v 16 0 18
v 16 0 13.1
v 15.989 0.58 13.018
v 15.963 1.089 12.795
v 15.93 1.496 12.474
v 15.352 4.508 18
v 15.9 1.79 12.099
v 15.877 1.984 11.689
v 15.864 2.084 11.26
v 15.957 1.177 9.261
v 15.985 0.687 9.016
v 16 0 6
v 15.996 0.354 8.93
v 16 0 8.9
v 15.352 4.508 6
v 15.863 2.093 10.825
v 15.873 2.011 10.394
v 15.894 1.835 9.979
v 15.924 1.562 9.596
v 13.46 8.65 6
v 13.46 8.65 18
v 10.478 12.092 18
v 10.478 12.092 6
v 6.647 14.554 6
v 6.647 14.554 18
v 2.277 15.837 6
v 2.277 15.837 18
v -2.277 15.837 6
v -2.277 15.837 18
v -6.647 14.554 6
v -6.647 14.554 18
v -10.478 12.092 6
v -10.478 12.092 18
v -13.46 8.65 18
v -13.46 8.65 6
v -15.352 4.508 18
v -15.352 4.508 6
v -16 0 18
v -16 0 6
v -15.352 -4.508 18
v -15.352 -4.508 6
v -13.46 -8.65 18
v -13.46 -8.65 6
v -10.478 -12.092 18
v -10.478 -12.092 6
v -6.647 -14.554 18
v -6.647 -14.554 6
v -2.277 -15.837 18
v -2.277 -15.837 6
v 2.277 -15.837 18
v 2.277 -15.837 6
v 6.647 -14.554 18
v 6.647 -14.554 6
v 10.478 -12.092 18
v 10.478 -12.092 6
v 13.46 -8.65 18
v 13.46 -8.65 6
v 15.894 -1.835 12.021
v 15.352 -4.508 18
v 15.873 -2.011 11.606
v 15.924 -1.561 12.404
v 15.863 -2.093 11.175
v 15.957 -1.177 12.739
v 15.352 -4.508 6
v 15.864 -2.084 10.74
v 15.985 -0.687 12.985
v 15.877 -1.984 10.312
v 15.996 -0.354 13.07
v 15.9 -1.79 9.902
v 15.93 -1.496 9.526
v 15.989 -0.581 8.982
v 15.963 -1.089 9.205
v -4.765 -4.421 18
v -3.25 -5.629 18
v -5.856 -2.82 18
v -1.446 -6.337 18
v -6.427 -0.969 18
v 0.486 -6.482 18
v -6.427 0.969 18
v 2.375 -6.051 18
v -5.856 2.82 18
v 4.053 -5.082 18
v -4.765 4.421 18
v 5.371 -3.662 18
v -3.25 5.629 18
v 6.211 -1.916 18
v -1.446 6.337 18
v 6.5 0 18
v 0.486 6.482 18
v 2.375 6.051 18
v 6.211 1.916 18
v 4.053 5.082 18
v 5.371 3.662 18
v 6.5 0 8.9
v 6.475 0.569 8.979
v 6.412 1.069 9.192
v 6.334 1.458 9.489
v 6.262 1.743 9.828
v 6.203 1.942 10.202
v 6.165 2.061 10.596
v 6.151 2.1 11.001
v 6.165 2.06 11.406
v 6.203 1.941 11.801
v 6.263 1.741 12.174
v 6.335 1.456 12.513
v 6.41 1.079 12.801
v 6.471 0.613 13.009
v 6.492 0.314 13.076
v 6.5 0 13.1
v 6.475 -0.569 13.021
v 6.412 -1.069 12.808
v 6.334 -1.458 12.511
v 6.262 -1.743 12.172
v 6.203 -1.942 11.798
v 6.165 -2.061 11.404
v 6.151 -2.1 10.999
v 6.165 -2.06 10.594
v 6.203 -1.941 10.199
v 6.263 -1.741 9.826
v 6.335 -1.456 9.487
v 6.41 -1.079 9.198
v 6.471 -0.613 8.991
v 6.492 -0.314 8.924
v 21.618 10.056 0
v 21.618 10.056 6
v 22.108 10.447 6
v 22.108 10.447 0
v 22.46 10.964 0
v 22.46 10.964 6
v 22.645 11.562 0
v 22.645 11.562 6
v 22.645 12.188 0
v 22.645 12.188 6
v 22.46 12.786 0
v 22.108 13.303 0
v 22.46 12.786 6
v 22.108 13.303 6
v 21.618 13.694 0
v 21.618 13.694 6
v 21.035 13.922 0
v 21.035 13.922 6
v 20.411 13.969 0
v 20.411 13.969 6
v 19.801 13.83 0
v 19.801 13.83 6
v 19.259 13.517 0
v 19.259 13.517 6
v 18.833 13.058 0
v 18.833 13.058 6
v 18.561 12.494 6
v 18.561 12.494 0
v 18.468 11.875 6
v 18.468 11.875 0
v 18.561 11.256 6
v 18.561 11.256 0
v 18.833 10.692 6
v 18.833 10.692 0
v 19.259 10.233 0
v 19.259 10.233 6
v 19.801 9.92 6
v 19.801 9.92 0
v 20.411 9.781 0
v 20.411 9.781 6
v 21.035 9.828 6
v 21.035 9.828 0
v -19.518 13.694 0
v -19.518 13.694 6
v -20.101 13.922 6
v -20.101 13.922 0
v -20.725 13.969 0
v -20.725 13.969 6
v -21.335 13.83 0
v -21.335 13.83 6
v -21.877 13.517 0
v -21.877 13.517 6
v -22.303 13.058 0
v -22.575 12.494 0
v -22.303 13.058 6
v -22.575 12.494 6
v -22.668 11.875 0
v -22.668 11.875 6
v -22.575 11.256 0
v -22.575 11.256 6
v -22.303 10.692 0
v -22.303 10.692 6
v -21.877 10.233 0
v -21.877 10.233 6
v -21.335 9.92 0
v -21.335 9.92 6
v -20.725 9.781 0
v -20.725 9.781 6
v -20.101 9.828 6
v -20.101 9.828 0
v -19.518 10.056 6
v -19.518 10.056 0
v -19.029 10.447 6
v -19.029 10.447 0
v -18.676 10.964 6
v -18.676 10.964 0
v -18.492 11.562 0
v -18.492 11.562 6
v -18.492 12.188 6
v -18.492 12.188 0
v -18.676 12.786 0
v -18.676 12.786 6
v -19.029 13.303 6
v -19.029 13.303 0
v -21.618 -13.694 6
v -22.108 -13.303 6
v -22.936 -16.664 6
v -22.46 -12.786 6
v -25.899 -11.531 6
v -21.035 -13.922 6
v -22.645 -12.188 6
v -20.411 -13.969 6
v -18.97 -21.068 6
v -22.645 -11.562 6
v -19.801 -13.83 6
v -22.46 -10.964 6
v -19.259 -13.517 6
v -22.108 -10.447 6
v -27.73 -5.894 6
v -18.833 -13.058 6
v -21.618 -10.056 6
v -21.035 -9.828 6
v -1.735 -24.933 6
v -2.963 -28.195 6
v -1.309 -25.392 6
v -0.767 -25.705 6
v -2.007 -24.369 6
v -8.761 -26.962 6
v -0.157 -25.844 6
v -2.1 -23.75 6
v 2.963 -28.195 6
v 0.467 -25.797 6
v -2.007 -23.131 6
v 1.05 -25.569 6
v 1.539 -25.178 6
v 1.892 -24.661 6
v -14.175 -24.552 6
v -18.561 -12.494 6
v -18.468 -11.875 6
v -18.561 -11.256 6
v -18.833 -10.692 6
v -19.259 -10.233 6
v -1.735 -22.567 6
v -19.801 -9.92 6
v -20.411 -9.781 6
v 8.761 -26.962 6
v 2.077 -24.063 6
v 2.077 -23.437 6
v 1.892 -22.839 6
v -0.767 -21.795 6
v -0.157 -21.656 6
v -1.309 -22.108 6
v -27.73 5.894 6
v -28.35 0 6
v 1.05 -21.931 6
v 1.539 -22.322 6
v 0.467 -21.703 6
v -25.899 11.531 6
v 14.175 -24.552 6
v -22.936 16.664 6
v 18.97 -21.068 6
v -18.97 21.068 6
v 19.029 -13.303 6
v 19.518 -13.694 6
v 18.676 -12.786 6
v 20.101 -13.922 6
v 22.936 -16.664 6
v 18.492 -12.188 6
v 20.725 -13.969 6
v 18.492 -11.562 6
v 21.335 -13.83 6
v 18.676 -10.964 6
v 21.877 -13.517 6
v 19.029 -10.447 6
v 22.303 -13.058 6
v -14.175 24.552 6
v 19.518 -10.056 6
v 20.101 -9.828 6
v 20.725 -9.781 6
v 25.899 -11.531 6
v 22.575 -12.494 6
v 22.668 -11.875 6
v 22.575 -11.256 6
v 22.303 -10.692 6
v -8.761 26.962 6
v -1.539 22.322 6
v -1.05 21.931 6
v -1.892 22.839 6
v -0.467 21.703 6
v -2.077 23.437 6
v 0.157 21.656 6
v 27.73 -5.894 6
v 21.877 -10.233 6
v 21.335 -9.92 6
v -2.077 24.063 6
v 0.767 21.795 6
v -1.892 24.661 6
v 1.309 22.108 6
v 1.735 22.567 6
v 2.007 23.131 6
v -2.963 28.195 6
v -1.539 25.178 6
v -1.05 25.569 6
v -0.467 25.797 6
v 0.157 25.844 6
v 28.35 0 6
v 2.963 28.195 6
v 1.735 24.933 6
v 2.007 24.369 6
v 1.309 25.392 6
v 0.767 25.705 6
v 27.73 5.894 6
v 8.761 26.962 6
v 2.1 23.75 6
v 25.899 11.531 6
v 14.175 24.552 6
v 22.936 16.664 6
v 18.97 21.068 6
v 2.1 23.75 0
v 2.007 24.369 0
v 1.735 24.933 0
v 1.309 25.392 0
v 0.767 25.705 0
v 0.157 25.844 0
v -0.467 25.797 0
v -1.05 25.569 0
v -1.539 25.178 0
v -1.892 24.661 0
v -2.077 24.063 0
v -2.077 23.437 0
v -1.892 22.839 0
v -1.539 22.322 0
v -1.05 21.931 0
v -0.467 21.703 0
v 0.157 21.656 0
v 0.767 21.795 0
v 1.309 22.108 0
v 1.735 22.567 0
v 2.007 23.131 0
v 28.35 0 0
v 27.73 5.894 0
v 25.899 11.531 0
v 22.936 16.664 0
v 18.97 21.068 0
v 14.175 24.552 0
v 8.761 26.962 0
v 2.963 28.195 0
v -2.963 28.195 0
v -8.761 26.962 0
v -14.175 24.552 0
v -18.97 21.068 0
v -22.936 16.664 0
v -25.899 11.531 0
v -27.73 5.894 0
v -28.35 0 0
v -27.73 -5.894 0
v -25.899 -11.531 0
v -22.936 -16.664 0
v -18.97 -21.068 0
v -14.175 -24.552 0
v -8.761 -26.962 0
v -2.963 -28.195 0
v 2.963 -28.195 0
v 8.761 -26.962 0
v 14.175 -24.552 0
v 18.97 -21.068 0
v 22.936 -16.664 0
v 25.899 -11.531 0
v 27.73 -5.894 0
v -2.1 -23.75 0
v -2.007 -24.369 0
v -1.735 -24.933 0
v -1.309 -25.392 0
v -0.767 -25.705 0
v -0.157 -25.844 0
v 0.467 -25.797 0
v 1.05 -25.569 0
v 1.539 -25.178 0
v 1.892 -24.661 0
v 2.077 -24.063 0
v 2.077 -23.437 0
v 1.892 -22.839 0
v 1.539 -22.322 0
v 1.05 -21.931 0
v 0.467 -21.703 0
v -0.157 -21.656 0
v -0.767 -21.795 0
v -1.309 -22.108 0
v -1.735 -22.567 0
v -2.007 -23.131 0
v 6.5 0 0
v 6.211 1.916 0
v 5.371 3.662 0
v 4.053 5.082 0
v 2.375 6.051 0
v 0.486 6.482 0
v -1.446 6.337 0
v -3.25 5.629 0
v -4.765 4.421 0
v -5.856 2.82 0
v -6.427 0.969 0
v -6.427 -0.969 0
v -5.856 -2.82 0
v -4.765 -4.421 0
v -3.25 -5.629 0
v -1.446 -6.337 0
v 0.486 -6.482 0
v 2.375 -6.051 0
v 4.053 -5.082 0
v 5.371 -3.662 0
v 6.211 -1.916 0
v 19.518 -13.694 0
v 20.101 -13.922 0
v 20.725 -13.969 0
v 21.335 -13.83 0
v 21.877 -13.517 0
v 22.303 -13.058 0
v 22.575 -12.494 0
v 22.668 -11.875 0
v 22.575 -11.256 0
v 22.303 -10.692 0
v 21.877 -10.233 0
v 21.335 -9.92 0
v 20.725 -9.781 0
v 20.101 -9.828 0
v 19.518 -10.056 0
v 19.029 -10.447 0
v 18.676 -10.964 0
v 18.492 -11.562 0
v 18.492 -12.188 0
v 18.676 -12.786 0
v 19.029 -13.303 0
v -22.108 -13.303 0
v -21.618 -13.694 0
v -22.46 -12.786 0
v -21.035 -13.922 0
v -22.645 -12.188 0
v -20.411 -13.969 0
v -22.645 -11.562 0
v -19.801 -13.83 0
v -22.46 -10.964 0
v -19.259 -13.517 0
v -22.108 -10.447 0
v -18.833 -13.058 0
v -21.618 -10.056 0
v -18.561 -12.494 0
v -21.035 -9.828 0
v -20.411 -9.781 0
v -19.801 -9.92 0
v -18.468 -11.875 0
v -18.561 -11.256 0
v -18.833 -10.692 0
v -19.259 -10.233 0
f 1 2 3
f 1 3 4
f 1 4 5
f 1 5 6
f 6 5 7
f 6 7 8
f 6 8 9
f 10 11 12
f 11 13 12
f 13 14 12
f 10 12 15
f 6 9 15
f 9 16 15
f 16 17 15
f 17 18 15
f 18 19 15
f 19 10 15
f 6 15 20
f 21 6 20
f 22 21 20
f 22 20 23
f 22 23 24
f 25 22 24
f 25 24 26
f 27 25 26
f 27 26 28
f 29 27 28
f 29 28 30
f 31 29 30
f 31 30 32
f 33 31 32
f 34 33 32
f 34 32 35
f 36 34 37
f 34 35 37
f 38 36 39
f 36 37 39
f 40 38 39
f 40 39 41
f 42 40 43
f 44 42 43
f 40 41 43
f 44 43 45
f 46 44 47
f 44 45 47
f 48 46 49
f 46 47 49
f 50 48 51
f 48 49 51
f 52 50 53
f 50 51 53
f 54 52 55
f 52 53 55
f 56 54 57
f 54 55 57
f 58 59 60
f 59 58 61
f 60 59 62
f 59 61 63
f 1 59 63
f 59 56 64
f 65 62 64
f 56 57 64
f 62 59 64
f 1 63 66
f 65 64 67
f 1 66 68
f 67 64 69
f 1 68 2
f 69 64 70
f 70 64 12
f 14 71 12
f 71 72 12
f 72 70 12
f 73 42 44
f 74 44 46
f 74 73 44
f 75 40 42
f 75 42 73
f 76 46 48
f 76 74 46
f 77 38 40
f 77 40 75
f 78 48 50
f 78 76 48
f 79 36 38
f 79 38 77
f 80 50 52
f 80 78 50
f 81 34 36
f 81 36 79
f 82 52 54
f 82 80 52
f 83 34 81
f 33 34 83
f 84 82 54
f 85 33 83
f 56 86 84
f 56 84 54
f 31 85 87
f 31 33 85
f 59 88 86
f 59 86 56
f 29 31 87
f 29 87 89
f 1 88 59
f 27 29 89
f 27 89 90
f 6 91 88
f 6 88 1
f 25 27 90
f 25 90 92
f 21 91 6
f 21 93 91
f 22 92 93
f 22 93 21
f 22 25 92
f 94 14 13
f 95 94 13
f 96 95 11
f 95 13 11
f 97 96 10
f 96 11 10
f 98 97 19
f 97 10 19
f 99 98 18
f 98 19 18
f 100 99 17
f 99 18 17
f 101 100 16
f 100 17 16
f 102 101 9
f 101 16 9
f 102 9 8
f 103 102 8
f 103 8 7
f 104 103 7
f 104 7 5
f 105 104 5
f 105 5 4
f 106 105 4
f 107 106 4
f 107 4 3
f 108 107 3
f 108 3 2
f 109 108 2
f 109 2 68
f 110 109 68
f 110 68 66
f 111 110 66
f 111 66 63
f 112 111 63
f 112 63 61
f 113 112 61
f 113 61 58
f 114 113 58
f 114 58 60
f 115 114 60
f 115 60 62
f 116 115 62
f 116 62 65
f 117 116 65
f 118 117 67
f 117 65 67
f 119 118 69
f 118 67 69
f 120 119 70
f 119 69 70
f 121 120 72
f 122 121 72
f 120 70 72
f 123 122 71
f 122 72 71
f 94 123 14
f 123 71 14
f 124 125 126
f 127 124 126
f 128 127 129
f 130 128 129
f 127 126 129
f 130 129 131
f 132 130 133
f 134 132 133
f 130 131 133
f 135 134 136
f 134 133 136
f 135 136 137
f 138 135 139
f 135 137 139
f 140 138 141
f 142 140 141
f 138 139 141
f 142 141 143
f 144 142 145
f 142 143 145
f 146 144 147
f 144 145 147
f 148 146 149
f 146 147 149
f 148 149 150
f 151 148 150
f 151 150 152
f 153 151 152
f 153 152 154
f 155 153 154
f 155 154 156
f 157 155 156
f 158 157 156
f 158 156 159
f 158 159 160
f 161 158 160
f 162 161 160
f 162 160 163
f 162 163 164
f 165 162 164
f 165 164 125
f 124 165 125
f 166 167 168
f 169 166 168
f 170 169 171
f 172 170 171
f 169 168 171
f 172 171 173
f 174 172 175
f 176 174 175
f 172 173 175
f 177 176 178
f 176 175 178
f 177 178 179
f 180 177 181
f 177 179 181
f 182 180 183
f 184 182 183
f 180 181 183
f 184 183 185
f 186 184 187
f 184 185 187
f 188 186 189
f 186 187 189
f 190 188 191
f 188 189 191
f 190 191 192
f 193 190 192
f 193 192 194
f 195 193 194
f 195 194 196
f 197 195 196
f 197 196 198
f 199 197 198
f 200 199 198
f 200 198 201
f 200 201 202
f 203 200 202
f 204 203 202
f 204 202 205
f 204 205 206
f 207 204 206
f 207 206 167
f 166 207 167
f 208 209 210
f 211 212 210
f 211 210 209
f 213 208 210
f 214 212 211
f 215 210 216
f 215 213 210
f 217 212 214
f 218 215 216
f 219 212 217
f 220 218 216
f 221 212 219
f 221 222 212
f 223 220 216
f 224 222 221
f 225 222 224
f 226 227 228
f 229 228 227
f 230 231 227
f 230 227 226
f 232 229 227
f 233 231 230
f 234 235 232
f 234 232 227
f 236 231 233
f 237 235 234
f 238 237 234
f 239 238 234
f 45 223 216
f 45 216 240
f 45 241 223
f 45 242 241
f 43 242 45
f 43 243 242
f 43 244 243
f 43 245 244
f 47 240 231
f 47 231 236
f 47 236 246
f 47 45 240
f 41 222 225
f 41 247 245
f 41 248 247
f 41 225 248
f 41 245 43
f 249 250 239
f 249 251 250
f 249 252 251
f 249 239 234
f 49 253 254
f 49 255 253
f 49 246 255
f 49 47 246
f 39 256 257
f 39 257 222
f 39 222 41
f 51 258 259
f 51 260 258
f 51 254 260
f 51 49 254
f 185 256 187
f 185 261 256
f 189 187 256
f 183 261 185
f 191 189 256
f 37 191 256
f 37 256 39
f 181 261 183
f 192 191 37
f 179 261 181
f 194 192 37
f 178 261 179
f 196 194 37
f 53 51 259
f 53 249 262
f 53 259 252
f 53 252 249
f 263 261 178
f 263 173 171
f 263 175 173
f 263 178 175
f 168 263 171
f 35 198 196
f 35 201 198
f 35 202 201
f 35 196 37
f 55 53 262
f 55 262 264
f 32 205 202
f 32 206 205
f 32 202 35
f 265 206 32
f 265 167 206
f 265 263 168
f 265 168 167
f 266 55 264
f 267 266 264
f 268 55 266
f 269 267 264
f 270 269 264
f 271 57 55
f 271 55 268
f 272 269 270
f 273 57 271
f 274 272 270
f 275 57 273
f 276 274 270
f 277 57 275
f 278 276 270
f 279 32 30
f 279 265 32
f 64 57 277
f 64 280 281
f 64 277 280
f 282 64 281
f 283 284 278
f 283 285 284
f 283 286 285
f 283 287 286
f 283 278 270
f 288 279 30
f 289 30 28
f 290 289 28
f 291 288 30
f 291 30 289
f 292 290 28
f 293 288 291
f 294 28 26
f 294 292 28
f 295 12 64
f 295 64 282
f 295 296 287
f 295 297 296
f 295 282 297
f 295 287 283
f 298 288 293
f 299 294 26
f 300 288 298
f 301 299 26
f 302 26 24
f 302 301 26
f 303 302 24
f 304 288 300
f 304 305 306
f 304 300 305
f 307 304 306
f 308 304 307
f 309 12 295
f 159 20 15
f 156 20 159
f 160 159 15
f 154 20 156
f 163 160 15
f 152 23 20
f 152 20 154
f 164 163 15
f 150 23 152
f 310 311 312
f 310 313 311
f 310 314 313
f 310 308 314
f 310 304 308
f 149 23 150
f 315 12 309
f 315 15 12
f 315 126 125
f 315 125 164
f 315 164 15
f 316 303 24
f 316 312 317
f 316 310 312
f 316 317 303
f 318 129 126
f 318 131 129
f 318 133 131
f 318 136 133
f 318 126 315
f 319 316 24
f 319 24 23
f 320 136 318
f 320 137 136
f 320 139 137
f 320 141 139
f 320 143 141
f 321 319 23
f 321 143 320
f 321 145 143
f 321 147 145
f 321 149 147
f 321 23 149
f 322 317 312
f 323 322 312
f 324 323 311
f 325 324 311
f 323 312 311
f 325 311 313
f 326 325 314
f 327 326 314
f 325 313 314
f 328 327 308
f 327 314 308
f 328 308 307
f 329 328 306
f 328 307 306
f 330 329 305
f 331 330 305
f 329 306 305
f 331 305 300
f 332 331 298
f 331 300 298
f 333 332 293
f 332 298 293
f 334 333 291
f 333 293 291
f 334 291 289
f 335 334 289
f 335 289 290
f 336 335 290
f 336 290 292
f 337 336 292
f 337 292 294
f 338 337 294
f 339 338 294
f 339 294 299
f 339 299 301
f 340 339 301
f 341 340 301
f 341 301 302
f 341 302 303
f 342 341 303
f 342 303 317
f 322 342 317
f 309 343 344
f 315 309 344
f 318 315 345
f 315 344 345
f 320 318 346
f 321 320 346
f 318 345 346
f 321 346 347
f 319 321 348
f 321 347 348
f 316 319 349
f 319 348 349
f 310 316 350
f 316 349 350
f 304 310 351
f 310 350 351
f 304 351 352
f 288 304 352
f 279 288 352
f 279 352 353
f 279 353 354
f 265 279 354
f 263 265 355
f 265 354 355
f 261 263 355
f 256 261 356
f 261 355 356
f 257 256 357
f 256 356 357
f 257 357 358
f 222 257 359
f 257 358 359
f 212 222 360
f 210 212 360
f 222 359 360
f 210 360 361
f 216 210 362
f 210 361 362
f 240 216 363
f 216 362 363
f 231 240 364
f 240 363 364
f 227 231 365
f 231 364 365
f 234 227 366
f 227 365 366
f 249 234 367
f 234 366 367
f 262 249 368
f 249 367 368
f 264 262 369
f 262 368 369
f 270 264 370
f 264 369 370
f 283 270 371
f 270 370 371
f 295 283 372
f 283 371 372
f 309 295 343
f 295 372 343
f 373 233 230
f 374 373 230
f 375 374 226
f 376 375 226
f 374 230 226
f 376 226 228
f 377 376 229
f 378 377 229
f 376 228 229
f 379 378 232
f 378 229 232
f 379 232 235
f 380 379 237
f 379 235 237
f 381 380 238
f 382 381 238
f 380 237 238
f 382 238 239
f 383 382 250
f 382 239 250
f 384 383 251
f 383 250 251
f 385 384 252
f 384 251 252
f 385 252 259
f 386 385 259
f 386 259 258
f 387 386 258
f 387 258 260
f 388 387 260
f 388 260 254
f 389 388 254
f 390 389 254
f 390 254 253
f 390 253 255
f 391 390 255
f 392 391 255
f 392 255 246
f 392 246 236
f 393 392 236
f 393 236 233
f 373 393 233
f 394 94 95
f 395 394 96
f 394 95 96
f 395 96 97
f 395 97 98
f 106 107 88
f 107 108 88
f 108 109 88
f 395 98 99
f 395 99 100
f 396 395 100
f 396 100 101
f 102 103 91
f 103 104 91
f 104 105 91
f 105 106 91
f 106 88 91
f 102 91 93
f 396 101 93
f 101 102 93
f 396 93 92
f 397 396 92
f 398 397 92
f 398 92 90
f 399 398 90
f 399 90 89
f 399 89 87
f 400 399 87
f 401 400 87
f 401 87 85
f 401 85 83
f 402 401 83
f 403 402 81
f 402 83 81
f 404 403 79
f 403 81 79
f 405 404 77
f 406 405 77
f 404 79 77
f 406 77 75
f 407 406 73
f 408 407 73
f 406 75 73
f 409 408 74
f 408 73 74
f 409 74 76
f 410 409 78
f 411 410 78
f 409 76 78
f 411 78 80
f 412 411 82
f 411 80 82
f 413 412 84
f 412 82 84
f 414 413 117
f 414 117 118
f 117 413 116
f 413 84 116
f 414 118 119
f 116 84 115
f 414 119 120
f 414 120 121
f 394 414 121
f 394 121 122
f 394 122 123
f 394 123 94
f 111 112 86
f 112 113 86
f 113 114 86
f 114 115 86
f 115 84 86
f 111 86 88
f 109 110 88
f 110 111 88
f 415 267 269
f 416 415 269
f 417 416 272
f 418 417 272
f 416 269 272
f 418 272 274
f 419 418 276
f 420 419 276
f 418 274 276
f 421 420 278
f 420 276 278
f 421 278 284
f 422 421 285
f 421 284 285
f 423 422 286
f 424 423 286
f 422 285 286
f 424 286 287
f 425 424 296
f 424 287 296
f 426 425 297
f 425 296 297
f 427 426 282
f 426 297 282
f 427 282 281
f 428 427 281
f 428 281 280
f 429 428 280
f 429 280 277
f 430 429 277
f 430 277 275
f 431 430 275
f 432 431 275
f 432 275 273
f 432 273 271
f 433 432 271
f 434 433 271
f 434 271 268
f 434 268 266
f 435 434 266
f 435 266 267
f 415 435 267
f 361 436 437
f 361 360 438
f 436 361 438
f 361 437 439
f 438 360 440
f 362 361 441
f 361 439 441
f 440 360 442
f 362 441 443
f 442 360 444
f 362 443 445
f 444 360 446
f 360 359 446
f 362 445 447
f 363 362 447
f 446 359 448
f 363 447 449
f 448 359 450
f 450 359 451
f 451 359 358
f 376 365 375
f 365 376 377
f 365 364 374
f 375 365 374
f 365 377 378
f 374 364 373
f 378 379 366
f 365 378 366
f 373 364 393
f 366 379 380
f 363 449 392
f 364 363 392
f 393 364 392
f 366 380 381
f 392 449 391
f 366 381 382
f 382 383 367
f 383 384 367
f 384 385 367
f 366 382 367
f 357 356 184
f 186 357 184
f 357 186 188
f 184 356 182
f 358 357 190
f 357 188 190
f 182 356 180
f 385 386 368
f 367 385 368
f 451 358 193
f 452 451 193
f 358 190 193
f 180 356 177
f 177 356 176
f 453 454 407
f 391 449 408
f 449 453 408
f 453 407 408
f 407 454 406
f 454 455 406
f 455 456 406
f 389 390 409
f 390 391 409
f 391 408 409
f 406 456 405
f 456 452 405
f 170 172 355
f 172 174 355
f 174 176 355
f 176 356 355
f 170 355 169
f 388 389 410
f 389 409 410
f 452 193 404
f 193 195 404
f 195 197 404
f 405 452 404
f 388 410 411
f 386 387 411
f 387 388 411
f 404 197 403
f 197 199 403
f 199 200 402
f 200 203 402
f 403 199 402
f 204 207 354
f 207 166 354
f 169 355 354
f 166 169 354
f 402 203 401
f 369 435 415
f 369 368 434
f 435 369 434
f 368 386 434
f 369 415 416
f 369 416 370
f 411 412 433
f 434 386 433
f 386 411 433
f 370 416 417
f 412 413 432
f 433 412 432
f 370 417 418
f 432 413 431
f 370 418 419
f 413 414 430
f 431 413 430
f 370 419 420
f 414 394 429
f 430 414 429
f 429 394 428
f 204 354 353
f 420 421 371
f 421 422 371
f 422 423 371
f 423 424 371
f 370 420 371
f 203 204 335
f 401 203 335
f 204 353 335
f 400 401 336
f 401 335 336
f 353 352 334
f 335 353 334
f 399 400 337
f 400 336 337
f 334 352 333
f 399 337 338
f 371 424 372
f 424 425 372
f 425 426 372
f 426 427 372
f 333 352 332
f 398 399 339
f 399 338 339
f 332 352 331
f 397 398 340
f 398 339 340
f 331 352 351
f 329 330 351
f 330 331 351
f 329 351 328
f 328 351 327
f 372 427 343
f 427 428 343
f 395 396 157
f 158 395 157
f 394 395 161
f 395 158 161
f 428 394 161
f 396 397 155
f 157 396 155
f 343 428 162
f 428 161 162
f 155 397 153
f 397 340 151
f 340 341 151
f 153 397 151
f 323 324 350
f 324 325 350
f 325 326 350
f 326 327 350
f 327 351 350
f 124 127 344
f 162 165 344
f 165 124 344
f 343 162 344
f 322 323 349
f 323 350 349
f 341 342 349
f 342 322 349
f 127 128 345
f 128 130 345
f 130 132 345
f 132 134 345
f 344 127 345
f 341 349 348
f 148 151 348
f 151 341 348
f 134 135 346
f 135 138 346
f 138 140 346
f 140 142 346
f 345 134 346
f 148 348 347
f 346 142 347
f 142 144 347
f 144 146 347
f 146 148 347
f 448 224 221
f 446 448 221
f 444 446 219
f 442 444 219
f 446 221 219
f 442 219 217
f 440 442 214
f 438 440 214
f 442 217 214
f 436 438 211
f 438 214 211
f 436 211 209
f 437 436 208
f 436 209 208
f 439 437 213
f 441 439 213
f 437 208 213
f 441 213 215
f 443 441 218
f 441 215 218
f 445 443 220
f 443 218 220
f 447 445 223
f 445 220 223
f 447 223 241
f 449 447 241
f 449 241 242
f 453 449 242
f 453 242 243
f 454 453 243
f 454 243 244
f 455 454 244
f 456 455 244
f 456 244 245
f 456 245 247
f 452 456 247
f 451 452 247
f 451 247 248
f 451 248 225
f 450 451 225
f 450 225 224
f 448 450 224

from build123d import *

# Parameters (mm, degrees)
SKETCH_1_R               = 28.35
EXTRUDE_1_DEPTH          = 6
SKETCH_2_R               = 16
EXTRUDE_2_DEPTH          = 12
SKETCH_3_R               = 6.5
CUT_EXTRUDE_1_DEPTH      = 44.948208155
HOLE_WIZARD_M5_2_D       = 4.2
PATTERN_CIRCULAR_1_COUNT = 6
CUT_EXTRUDE_3_REACH      = 57.63
SKETCH_6_R               = 2.1


with BuildPart() as part:
    # 草圖1 → 填料-伸長1 (new body)
    with BuildSketch(Plane.XY):
        Circle(SKETCH_1_R)
    extrude(amount=EXTRUDE_1_DEPTH)

    # 草圖2 → 填料-伸長2 (add)
    with BuildSketch(Plane.XY.offset(6)):
        Circle(SKETCH_2_R)
    extrude(amount=EXTRUDE_2_DEPTH)

    # 草圖3 → 除料-伸長1 (cut, through all)
    with BuildSketch(Plane.XY.offset(18)):
        Circle(SKETCH_3_R)
    extrude(amount=-CUT_EXTRUDE_1_DEPTH, mode=Mode.SUBTRACT)

    # M5 螺紋孔2 (through all)
    with Locations(Plane(origin=(0, 0, 0), x_dir=(-1, 0, 0), z_dir=(0, 0, -1))):
        with Locations((0, 23.75)):
            hole_wizard_m5_2 = Hole(HOLE_WIZARD_M5_2_D / 2)

    # 環狀複製排列1: M5 螺紋孔2 ×6 about axis
    pattern_circular_1_axis = Axis((0, 0, 6), (0, 0, 1))
    for i in range(1, PATTERN_CIRCULAR_1_COUNT):
        add(hole_wizard_m5_2.rotate(pattern_circular_1_axis, i * 360 / PATTERN_CIRCULAR_1_COUNT), mode=Mode.SUBTRACT)

    # 草圖6 → 除料-伸長3 (cut, up to next)
    with BuildSketch(Plane(origin=(16, 0, 0), x_dir=(0, 0, -1), z_dir=(1, 0, 0)), mode=Mode.PRIVATE) as cut_extrude_3_sk1:
        with Locations((-11, 0)):
            Circle(SKETCH_6_R)
    cut_extrude_3_tool1 = extrude(cut_extrude_3_sk1.sketch, amount=-CUT_EXTRUDE_3_REACH, mode=Mode.PRIVATE) & part.part
    add(cut_extrude_3_tool1.solids().sort_by_distance((16, 0, 11))[0], mode=Mode.SUBTRACT)


solid = part.part
